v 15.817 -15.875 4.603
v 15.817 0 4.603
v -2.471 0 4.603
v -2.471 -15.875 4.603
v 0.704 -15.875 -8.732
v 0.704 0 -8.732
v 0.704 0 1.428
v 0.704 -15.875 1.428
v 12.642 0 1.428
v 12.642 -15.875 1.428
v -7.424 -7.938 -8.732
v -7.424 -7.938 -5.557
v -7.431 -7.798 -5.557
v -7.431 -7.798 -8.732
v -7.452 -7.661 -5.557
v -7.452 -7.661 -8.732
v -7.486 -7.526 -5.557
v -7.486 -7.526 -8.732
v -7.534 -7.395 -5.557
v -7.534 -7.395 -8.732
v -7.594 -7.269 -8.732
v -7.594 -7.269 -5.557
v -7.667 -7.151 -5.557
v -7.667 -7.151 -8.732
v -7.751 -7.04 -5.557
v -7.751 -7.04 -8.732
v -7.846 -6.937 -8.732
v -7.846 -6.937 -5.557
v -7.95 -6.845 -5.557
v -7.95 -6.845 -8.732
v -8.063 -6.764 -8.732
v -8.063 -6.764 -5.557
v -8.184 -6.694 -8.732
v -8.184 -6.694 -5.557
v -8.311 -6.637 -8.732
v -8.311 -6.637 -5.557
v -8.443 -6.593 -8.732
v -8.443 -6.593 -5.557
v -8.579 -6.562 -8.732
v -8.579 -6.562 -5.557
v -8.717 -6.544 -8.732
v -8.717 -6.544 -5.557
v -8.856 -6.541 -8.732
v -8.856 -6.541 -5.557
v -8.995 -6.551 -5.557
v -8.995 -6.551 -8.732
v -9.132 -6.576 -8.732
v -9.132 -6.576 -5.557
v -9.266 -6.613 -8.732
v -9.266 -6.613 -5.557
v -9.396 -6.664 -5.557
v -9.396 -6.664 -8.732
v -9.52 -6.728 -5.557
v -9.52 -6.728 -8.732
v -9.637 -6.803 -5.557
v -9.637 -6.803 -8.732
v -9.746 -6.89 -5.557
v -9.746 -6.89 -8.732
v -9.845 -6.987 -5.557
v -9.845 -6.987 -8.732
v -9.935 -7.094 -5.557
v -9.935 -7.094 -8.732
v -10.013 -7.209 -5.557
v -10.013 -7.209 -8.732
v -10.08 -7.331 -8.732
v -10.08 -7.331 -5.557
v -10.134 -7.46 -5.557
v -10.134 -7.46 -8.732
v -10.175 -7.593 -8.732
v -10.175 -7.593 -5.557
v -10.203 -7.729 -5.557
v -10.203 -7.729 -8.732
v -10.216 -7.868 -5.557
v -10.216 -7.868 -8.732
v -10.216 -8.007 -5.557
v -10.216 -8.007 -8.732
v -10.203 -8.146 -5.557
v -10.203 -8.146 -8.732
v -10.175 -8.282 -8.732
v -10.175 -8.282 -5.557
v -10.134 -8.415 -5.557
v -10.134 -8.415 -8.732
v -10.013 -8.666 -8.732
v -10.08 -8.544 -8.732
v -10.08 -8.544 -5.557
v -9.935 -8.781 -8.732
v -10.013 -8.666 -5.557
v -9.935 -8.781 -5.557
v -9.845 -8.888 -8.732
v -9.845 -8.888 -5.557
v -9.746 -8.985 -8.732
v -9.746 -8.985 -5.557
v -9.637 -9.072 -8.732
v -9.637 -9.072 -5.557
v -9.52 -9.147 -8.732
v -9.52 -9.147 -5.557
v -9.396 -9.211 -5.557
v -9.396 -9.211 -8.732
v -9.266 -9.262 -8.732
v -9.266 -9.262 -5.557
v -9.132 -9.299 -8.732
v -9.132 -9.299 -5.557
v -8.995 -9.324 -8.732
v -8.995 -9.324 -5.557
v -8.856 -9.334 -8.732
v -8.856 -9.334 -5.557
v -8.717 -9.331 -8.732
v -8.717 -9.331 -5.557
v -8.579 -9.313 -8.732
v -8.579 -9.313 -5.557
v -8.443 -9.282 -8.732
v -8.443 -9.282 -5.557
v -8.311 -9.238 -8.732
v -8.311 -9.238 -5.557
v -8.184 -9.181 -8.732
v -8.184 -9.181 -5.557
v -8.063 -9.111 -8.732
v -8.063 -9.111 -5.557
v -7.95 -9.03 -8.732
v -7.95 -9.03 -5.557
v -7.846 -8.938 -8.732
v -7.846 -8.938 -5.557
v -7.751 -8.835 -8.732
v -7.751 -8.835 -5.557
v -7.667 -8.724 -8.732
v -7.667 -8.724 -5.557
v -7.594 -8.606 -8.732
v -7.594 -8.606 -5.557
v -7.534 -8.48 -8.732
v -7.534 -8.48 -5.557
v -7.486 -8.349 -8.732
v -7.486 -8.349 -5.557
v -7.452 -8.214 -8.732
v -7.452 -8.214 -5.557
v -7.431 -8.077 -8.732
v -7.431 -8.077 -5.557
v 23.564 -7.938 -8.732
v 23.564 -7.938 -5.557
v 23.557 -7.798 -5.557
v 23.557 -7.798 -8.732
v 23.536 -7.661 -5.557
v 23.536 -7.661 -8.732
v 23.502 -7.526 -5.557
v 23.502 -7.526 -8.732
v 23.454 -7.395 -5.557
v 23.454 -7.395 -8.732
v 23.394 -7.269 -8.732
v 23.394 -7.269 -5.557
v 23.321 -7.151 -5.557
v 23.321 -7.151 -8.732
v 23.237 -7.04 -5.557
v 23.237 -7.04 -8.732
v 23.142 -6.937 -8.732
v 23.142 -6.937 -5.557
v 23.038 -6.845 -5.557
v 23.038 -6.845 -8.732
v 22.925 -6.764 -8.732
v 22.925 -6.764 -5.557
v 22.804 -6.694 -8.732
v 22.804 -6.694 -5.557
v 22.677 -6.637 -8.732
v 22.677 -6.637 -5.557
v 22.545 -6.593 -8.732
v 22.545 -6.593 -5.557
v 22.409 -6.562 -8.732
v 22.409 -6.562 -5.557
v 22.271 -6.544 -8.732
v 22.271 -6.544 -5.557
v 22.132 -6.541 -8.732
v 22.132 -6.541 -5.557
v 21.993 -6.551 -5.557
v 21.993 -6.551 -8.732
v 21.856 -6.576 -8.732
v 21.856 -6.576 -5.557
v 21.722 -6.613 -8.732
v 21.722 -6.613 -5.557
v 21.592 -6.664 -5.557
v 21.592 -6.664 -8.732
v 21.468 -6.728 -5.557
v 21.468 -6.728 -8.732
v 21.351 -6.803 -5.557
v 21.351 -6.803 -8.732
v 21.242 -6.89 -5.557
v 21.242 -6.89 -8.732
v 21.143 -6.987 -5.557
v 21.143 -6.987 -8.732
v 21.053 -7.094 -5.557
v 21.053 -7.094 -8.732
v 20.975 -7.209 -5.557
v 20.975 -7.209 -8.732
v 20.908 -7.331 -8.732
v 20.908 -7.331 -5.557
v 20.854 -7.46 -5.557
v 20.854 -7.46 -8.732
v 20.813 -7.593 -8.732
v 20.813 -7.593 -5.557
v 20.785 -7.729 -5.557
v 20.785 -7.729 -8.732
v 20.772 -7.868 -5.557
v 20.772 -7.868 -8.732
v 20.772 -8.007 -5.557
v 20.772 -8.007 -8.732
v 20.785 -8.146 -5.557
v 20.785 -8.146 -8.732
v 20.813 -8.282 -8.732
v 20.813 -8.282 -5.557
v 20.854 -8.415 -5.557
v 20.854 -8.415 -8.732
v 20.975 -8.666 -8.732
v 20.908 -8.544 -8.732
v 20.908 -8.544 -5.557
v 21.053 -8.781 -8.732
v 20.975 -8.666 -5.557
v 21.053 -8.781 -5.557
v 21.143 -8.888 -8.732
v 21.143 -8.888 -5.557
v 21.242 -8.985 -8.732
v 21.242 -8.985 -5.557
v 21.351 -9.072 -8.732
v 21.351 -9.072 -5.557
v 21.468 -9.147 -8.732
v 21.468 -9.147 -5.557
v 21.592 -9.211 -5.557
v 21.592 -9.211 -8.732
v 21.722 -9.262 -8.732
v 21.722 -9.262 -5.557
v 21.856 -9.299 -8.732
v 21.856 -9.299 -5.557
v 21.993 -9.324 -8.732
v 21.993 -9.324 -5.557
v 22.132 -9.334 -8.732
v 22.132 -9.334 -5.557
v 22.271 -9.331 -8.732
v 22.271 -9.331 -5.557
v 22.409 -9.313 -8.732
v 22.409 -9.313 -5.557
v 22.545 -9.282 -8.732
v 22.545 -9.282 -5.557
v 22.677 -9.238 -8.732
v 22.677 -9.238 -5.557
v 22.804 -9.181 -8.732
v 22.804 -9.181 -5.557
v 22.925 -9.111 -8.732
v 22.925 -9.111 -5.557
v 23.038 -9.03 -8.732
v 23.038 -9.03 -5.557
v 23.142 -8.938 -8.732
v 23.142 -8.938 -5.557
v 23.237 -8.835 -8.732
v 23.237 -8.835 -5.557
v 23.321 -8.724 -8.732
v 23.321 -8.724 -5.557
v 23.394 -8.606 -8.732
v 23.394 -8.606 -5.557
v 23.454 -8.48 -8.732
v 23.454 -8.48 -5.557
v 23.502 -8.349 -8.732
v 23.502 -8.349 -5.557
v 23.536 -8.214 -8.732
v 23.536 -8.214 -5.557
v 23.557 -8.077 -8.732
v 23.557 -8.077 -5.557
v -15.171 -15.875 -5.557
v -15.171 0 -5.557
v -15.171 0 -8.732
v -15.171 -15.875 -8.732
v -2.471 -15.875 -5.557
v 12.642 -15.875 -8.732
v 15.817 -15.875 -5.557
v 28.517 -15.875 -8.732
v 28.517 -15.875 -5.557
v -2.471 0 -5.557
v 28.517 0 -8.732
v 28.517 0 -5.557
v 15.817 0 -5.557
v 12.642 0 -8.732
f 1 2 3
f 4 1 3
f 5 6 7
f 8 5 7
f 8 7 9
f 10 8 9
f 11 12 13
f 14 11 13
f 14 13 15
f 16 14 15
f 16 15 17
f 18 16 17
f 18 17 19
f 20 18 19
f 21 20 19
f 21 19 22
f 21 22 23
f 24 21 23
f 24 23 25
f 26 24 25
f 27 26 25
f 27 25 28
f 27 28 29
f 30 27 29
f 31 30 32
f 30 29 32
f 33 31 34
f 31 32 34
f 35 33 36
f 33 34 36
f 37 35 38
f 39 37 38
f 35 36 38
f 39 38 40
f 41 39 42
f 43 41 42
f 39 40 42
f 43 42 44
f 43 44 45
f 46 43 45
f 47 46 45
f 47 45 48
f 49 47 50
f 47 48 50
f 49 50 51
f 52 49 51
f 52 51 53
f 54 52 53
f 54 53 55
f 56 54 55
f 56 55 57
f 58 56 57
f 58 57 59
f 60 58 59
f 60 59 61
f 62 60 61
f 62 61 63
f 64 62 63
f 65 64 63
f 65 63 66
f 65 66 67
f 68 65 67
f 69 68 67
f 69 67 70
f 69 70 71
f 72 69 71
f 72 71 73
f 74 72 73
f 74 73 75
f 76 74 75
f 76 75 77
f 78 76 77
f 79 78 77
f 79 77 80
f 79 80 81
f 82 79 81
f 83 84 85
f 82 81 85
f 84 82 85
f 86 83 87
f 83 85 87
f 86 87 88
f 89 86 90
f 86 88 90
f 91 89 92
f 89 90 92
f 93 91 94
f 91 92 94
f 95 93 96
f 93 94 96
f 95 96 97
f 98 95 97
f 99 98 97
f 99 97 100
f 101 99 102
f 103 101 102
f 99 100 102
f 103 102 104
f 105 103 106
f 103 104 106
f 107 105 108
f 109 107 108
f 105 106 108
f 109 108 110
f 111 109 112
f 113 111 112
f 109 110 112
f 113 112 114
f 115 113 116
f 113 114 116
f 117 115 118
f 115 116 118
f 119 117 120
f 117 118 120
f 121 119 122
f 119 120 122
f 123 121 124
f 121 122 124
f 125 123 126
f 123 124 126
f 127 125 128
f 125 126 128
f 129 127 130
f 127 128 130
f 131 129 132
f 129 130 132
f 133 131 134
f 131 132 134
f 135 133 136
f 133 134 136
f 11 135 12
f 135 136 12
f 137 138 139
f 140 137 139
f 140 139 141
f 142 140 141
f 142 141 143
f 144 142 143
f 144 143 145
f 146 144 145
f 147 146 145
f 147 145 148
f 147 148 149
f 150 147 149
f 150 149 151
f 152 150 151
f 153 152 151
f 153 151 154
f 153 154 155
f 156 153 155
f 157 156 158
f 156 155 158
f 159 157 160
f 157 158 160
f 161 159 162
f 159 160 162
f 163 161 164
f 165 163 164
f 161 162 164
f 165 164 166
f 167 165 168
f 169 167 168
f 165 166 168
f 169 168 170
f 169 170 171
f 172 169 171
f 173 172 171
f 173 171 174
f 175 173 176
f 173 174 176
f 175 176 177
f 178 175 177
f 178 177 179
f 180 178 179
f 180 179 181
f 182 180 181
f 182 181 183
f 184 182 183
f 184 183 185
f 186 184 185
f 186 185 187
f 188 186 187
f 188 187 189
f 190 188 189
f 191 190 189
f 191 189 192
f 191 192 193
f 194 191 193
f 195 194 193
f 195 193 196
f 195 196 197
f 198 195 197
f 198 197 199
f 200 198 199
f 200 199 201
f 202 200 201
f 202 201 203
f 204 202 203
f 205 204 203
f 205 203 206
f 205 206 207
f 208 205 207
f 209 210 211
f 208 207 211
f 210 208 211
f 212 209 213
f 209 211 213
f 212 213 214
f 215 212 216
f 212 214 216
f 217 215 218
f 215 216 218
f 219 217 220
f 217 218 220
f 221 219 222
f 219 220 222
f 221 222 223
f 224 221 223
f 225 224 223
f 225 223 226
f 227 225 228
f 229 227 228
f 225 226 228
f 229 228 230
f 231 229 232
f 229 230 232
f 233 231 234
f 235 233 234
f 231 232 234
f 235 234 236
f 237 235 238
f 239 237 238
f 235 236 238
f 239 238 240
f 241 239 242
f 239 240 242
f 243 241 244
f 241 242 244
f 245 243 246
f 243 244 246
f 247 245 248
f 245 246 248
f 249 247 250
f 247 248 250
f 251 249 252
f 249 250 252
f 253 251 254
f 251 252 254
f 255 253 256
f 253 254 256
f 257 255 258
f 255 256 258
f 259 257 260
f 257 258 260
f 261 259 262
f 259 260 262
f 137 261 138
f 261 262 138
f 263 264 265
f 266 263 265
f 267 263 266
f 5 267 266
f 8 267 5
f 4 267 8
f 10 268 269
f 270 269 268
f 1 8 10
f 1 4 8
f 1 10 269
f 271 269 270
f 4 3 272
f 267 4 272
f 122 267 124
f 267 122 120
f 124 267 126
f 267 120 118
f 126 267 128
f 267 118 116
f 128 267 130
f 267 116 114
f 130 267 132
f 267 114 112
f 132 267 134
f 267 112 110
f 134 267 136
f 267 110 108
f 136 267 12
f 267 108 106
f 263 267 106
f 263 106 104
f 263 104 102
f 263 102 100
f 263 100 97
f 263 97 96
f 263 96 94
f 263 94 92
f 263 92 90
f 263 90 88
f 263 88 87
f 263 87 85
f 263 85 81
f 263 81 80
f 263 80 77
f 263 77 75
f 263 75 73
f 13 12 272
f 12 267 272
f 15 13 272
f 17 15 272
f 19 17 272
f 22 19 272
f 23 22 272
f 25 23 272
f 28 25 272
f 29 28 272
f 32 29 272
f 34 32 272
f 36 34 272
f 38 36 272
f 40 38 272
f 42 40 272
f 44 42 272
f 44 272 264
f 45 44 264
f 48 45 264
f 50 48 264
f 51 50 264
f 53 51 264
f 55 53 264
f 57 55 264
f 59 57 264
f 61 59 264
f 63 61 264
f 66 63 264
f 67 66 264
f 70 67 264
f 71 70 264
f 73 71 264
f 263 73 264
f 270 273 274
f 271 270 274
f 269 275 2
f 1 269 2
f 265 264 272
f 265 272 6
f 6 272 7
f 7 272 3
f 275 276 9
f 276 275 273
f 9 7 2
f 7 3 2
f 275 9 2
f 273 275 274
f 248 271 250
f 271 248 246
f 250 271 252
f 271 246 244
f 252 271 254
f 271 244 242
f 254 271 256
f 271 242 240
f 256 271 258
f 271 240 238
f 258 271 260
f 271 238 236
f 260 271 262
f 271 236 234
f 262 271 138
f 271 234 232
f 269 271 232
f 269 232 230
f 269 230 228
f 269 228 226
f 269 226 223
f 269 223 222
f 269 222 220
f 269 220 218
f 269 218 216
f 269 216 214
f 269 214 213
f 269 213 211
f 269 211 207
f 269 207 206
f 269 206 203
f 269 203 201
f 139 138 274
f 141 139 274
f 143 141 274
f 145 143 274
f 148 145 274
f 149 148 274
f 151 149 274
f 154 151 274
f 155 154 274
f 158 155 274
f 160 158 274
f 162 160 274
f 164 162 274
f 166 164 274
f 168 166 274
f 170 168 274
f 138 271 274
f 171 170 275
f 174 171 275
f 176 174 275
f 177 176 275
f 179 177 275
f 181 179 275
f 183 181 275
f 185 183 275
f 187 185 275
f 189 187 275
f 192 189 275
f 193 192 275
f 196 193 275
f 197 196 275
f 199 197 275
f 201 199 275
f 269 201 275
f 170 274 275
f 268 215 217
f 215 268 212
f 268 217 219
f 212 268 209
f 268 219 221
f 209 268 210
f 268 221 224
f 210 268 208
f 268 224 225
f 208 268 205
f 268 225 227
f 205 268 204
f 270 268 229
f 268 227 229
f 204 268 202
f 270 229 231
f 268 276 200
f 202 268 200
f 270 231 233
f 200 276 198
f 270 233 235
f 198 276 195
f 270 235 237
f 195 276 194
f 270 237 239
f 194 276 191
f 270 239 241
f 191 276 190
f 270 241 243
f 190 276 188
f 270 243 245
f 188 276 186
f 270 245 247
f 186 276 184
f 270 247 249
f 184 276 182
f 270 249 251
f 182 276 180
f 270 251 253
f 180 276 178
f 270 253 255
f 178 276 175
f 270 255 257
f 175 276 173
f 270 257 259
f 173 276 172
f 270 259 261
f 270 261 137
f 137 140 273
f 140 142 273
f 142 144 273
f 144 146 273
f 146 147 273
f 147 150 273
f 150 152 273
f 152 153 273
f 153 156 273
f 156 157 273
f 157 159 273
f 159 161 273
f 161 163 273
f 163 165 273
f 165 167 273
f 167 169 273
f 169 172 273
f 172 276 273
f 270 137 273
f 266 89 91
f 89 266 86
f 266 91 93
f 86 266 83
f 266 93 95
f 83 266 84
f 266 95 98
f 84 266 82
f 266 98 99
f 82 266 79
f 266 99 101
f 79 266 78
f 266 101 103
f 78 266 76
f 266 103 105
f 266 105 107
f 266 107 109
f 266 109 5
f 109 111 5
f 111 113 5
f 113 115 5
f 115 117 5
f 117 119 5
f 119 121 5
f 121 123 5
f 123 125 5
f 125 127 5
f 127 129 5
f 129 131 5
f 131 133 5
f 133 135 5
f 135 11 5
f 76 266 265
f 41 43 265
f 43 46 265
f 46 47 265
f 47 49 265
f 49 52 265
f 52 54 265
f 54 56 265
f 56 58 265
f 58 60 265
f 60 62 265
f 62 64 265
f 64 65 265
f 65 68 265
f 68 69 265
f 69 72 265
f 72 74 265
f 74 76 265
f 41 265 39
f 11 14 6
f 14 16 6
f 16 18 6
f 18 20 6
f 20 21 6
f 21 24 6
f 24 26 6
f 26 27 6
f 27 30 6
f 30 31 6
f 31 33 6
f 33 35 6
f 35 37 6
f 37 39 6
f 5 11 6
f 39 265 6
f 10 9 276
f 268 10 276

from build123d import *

# Parameters (mm, degrees)
F1_DEPTH = 15.875
F2_R     = 1.397
F3_DEPTH = 25.4


with BuildPart() as f1:
    # F0 (on Front) → F1 (new body)
    with BuildSketch(Plane.XZ):
        Polygon((0.703792, -5.557425), (0.703792, 1.427575), (12.641792, 1.427575), (12.641792, -5.557425), (12.641792, -8.732425), (28.516792, -8.732425), (28.516792, -5.557425), (15.816792, -5.557425), (15.816792, 4.602575), (-2.471208, 4.602575), (-2.471208, 0), (-2.471208, -5.557425), (-15.171208, -5.557425), (-15.171208, -8.732425), (-2.471208, -8.732425), (0.703792, -8.732425), align=None)
    extrude(amount=F1_DEPTH)

    # F2 (on face) → F3 (cut)
    with BuildSketch(Plane.XY.offset(-5.557425)):
        with Locations((-8.821208, -7.9375)):
            Circle(F2_R)
        with Locations((22.166792, -7.9375)):
            Circle(F2_R)
    extrude(amount=-F3_DEPTH, mode=Mode.SUBTRACT)


solid = f1.part
